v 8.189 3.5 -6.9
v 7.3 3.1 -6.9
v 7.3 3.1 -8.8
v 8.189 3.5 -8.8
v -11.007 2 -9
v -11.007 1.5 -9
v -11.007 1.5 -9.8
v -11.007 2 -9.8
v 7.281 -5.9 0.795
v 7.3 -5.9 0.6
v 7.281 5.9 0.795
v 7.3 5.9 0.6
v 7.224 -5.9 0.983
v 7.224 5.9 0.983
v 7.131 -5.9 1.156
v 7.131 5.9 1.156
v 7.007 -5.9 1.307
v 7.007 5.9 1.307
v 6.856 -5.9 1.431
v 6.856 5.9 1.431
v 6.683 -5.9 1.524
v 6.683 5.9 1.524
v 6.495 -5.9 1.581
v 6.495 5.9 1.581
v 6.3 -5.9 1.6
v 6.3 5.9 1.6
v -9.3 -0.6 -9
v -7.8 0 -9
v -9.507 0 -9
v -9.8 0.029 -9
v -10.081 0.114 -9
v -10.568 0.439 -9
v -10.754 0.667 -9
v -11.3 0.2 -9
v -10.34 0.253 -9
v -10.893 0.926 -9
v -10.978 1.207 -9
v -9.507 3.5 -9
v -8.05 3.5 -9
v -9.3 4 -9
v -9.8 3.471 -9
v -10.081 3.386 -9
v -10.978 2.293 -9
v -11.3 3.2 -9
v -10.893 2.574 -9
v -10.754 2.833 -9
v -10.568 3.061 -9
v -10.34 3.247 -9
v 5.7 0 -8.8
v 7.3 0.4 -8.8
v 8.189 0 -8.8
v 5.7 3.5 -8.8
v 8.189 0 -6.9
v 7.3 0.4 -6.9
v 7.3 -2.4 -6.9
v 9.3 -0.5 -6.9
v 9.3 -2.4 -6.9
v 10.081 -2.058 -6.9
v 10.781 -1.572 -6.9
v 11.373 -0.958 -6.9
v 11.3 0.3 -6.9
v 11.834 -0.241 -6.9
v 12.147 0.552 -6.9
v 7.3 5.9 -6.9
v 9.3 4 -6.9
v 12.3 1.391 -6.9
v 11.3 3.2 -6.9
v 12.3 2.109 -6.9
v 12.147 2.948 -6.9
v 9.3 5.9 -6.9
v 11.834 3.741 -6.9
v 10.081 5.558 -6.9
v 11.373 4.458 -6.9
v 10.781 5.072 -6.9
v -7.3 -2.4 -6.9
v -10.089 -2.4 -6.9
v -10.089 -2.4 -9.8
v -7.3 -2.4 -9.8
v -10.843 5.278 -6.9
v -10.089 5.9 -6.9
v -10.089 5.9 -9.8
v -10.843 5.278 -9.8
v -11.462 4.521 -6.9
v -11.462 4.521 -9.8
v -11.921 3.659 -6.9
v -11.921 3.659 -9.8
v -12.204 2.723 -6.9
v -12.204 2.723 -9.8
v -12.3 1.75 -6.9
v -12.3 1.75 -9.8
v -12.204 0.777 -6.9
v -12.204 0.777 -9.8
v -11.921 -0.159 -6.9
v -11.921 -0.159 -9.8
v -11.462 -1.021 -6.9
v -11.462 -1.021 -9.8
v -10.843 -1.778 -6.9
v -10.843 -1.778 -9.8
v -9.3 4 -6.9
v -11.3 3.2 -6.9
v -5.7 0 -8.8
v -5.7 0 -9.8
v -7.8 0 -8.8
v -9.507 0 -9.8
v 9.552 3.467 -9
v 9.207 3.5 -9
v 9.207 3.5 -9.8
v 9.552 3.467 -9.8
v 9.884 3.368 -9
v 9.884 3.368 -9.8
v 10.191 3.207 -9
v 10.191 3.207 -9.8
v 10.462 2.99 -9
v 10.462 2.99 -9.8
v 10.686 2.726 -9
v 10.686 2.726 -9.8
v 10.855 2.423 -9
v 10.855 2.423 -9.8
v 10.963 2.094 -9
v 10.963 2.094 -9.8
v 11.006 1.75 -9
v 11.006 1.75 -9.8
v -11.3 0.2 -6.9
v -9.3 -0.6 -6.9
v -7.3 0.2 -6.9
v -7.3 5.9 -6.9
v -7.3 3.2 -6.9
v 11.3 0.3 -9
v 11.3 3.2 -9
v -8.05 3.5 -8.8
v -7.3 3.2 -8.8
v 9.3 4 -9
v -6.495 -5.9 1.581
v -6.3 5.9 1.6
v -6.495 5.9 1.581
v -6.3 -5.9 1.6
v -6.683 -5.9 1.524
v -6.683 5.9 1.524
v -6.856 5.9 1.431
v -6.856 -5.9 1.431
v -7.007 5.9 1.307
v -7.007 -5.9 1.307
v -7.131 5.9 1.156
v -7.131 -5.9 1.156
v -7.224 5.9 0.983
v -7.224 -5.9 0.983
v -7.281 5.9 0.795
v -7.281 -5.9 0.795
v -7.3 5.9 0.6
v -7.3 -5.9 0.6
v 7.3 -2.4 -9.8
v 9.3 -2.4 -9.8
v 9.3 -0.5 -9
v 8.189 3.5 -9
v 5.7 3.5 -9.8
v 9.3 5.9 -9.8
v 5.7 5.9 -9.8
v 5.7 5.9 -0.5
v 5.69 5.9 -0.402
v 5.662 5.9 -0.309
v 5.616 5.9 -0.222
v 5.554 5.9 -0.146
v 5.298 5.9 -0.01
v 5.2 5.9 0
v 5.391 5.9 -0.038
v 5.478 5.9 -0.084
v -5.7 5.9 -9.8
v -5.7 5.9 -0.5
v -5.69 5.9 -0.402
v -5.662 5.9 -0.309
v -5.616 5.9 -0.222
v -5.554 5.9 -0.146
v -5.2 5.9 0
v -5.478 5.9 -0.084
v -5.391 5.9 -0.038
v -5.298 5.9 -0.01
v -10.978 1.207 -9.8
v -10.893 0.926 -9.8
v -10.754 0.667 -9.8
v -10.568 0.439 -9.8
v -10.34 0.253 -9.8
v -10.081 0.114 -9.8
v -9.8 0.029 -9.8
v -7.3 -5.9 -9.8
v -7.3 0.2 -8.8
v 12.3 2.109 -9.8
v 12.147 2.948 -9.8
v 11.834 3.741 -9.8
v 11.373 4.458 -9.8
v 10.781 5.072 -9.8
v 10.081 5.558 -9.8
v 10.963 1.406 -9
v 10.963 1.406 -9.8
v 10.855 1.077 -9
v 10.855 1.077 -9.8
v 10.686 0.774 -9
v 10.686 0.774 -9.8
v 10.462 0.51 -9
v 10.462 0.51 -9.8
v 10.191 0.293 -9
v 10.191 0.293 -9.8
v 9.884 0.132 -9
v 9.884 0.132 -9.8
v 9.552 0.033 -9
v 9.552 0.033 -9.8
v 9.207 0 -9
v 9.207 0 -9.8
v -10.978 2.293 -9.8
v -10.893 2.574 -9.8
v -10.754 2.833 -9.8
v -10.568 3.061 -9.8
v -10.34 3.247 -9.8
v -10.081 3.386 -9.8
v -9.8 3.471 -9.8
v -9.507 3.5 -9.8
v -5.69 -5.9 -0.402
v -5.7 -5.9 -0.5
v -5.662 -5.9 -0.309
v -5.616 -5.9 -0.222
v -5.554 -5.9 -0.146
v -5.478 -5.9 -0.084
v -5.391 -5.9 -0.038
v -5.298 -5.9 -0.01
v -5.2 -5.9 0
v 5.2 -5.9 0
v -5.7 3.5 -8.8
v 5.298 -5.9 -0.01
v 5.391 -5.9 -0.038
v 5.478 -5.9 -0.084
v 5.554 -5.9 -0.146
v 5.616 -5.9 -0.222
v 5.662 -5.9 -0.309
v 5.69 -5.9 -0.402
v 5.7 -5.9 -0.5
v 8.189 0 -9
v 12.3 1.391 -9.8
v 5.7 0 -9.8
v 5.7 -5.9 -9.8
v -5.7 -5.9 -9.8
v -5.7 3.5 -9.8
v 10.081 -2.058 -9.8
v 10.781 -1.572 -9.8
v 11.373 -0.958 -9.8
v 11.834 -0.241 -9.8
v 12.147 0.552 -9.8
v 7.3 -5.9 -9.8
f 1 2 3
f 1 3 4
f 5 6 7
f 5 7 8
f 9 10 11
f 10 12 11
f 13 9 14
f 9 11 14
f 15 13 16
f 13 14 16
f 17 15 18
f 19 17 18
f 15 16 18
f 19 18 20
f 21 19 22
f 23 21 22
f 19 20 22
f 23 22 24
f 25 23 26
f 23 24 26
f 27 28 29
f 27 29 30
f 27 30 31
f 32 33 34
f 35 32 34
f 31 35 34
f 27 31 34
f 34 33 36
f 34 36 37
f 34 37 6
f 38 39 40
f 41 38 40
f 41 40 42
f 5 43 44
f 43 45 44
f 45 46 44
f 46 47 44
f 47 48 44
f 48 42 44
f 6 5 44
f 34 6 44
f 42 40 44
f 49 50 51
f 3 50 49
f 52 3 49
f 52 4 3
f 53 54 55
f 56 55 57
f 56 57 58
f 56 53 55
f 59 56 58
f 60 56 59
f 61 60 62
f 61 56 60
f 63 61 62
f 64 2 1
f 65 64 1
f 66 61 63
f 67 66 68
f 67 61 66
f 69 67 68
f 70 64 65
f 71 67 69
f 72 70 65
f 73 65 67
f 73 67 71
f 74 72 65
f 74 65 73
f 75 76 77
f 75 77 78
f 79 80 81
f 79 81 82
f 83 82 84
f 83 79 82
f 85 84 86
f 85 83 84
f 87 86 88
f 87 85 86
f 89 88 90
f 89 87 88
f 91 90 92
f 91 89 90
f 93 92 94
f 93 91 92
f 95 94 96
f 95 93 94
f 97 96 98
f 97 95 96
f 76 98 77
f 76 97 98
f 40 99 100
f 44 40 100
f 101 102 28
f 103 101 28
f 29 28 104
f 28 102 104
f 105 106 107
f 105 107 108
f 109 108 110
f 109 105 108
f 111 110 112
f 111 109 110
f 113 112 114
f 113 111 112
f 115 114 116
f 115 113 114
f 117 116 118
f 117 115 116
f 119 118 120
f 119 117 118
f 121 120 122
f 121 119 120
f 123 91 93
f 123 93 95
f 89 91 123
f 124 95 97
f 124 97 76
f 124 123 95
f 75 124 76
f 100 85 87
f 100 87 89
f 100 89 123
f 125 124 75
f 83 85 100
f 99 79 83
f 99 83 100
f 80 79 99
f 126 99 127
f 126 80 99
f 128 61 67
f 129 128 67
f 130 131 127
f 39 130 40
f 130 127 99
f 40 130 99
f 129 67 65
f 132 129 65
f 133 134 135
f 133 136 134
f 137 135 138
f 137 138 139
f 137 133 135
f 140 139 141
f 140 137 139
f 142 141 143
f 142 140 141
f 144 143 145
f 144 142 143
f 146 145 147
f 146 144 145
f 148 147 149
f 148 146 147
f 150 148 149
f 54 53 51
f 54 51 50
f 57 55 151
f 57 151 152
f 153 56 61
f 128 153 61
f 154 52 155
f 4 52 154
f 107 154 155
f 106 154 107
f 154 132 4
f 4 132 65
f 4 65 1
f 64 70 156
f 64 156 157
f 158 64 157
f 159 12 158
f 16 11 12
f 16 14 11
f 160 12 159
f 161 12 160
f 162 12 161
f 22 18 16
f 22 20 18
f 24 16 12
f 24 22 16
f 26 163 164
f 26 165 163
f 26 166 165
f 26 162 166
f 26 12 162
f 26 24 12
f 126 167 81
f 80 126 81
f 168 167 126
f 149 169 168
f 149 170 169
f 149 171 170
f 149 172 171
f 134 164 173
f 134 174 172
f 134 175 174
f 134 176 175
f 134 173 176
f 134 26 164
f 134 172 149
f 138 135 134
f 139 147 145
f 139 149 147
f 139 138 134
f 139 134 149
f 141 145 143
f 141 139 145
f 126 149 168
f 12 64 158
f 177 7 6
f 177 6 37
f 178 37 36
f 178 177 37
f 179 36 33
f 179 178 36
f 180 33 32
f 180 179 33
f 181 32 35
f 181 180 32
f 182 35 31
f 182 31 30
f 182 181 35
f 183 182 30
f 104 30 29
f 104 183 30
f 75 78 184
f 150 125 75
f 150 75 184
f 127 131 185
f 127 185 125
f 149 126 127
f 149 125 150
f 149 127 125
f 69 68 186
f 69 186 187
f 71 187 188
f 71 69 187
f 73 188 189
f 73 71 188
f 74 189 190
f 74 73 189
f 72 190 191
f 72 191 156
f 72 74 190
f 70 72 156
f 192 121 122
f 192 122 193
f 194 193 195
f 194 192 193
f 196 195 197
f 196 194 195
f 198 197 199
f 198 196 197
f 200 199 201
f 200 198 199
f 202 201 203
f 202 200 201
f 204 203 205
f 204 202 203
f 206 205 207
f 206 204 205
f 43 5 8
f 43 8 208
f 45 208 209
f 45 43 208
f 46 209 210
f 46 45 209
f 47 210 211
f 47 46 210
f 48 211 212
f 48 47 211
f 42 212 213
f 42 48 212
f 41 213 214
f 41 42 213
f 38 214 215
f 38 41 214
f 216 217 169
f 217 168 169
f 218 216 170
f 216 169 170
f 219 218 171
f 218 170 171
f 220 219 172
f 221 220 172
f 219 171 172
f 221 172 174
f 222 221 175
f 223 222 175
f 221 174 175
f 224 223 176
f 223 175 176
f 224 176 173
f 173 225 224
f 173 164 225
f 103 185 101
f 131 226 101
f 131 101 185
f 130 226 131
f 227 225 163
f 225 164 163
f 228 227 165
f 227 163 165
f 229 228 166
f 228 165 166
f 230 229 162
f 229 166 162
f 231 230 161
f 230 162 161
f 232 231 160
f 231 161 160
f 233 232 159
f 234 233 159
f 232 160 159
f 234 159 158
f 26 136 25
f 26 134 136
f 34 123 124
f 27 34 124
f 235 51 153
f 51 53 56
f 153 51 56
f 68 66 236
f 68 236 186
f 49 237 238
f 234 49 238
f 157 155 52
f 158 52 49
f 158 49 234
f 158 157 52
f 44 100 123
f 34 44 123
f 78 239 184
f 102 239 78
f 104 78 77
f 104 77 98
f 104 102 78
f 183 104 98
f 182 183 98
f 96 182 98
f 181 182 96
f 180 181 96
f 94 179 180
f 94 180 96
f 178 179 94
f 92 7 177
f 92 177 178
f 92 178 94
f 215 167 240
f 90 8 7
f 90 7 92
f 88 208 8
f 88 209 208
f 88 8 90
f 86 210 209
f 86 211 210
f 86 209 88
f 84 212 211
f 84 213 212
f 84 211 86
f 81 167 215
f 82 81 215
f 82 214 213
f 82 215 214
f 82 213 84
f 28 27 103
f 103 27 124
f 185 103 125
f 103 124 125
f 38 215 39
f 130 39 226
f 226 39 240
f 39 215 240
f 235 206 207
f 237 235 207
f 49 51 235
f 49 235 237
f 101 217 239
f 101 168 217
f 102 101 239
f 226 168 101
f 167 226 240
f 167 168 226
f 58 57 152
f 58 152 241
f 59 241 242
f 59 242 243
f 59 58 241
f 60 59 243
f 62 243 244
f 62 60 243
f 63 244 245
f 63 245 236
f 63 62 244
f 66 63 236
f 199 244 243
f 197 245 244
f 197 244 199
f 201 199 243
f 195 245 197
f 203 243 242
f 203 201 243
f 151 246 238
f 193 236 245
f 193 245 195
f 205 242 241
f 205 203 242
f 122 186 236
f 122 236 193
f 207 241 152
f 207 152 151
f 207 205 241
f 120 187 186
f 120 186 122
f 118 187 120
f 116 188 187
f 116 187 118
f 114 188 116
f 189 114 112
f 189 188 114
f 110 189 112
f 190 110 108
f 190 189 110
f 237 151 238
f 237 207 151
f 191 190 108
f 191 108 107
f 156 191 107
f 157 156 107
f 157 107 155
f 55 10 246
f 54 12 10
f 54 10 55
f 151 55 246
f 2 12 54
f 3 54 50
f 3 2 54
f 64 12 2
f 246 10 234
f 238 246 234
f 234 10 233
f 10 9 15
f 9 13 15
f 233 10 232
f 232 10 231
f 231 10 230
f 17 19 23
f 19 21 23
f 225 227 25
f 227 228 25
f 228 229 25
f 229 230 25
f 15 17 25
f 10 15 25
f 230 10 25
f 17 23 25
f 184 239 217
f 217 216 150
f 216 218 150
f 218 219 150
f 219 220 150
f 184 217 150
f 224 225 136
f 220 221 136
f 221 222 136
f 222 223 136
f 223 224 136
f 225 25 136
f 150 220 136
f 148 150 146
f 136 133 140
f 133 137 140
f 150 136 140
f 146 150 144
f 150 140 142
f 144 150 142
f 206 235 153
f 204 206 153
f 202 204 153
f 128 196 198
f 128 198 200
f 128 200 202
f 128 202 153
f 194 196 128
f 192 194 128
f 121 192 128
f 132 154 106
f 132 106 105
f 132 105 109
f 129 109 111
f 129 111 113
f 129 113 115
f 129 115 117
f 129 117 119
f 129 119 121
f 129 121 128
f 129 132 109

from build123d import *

# Parameters (mm, degrees)
EXTRUDE_1_DEPTH      = 11.4
SKETCH_2_W           = 11.4
SKETCH_2_H           = 8.3
CUT_EXTRUDE_1_DEPTH  = 9.8
CUT_EXTRUDE_2_DEPTH  = 10.6
CUT_EXTRUDE_3_DEPTH  = 0.8
CUT_EXTRUDE_4_DEPTH  = 8.5
CUT_EXTRUDE_5_DEPTH  = 0.8
CUT_EXTRUDE_6_DEPTH  = 2.1
CUT_EXTRUDE_7_DEPTH  = 0.2
CUT_EXTRUDE_8_DEPTH  = 1
CUT_EXTRUDE_9_DEPTH  = 8.5
CUT_EXTRUDE_10_DEPTH = 1.9
CUT_EXTRUDE_11_DEPTH = 0.2
EXTRUDE_2_DEPTH      = 3.5
FILLET_1_R           = 0.5
FILLET_2_R           = 1
FILLET_3_R           = 1.5


with BuildPart() as part:
    # 草图1 → 凸台-拉伸1 (new body)
    with BuildSketch(Plane.XY.offset(1.6)):
        with BuildLine():
            Line((-10.088816953, -2.4), (9.3, -2.4))
            ThreePointArc((9.3, -2.4), (11.373008704, -0.957826085), (12.3, 1.391198782))
            Line((12.3, 1.391198782), (12.3, 2.108801218))
            ThreePointArc((12.3, 2.108801218), (11.373008704, 4.457826085), (9.3, 5.9))
            Line((9.3, 5.9), (-10.088816953, 5.9))
            ThreePointArc((-10.088816953, 5.9), (-12.3, 1.75), (-10.088816953, -2.4))
        make_face()
        with BuildLine():
            Line((-7.8, 0), (-10.8, 0))
            Line((-10.8, 0), (-11.007, 0.0828))
            Line((-11.007, 0.0828), (-11.007, 2))
            ThreePointArc((-11.007, 2), (-10.567660172, 3.060660172), (-9.507, 3.5))
            Line((-9.507, 3.5), (-8.05, 3.5))
            Line((-8.05, 3.5), (-7.3, 3.2))
            Line((-7.3, 3.2), (-7.3, 0.2))
            Line((-7.3, 0.2), (-7.8, 0))
        make_face(mode=Mode.SUBTRACT)
        with BuildLine():
            Line((7.3, 0.4), (7.3, 3.1))
            Line((7.3, 3.1), (8.188888889, 3.5))
            Line((8.188888889, 3.5), (9.206872393, 3.5))
            ThreePointArc((9.206872393, 3.5), (10.461862433, 2.99034879), (11.006177815, 1.75))
            ThreePointArc((11.006177815, 1.75), (10.461862433, 0.50965121), (9.206872393, 0))
            Line((9.206872393, 0), (8.188888889, 0))
            Line((8.188888889, 0), (7.3, 0.4))
        make_face(mode=Mode.SUBTRACT)
    extrude(amount=-EXTRUDE_1_DEPTH)

    # 草图2 → 切除-拉伸1 (cut)
    with BuildSketch(Plane(origin=(0, 0, -9.8), x_dir=(-1, 0, 0), z_dir=(0, 0, -1))):
        with Locations((0, 1.75)):
            Rectangle(SKETCH_2_W, SKETCH_2_H)
    extrude(amount=-CUT_EXTRUDE_1_DEPTH, mode=Mode.SUBTRACT)

    # 草图3 → 切除-拉伸2 (cut)
    with BuildSketch(Plane.XY.offset(1.6)):
        Polygon((-7.8, 0), (-10.8, 0), (-9.3, -0.6), align=None)
    extrude(amount=-CUT_EXTRUDE_2_DEPTH, mode=Mode.SUBTRACT)

    # 草图4 → 切除-拉伸3 (cut)
    with BuildSketch(Plane(origin=(0, 0, -9.8), x_dir=(-1, 0, 0), z_dir=(0, 0, -1))):
        Polygon((11.007, 0.0828), (10.8, 0), (11.007, 0), align=None)
    extrude(amount=-CUT_EXTRUDE_3_DEPTH, mode=Mode.SUBTRACT)

    # 草图5 → 切除-拉伸4 (cut)
    with BuildSketch(Plane.XY.offset(1.6)):
        with BuildLine():
            Line((-9.507, 3.5), (-8.05, 3.5))
            Line((-8.05, 3.5), (-7.3, 3.2))
            Line((-7.3, 3.2), (-7.3, 5.9))
            Line((-7.3, 5.9), (-10.088816953, 5.9))
            ThreePointArc((-10.088816953, 5.9), (-12.3, 1.75), (-10.088816953, -2.4))
            Line((-10.088816953, -2.4), (-7.3, -2.4))
            Line((-7.3, -2.4), (-7.3, 0.2))
            Line((-7.3, 0.2), (-9.3, -0.6))
            Line((-9.3, -0.6), (-11.007, 0.0828))
            Line((-11.007, 0.0828), (-11.007, 2))
            ThreePointArc((-11.007, 2), (-10.567660172, 3.060660172), (-9.507, 3.5))
        make_face()
    extrude(amount=-CUT_EXTRUDE_4_DEPTH, mode=Mode.SUBTRACT)

    # 草图6 → 切除-拉伸5 (cut)
    with BuildSketch(Plane(origin=(0, 0, -9.8), x_dir=(-1, 0, 0), z_dir=(0, 0, -1))):
        Polygon((7.3, 3.2), (8.05, 3.5), (5.7, 3.5), (5.7, 0), (7.8, 0), (7.3, 0.2), align=None)
    extrude(amount=-CUT_EXTRUDE_5_DEPTH, mode=Mode.SUBTRACT)

    # 草图7 → 切除-拉伸6 (cut)
    with BuildSketch(Plane.XY.offset(-6.9)):
        with BuildLine():
            Line((-9.507, 3.5), (-8.05, 3.5))
            Line((-8.05, 3.5), (-9.3, 4))
            Line((-9.3, 4), (-11.3, 3.2))
            Line((-11.3, 3.2), (-11.3, 0.2))
            Line((-11.3, 0.2), (-11.007, 0.0828))
            Line((-11.007, 0.0828), (-11.007, 2))
            ThreePointArc((-11.007, 2), (-10.567660172, 3.060660172), (-9.507, 3.5))
        make_face()
    extrude(amount=-CUT_EXTRUDE_6_DEPTH, mode=Mode.SUBTRACT)

    # 草图8 → 切除-拉伸7 (cut)
    with BuildSketch(Plane(origin=(0, 0, -9), x_dir=(-1, 0, 0), z_dir=(0, 0, -1))):
        Polygon((7.3, 3.2), (8.05, 3.5), (5.7, 3.5), (5.7, 0), (7.8, 0), (7.3, 0.2), align=None)
    extrude(amount=-CUT_EXTRUDE_7_DEPTH, mode=Mode.SUBTRACT)

    # 草图9 → 切除-拉伸8 (cut)
    with BuildSketch(Plane(origin=(0, 0, -9.8), x_dir=(-1, 0, 0), z_dir=(0, 0, -1))):
        Polygon((-7.3, 0.4), (-8.188888889, 0), (-5.7, 0), (-5.7, 3.5), (-8.188888889, 3.5), (-7.3, 3.1), align=None)
    extrude(amount=-CUT_EXTRUDE_8_DEPTH, mode=Mode.SUBTRACT)

    # 草图10 → 切除-拉伸9 (cut)
    with BuildSketch(Plane.XY.offset(1.6)):
        with BuildLine():
            Line((9.206872393, 0), (8.188888889, 0))
            Line((8.188888889, 0), (7.3, 0.4))
            Line((7.3, 0.4), (7.3, -2.4))
            Line((7.3, -2.4), (9.3, -2.4))
            ThreePointArc((9.3, -2.4), (11.373008704, -0.957826085), (12.3, 1.391198782))
            Line((12.3, 1.391198782), (12.3, 2.108801218))
            ThreePointArc((12.3, 2.108801218), (11.373008704, 4.457826085), (9.3, 5.9))
            Line((9.3, 5.9), (7.3, 5.9))
            Line((7.3, 5.9), (7.3, 3.1))
            Line((7.3, 3.1), (8.188888889, 3.5))
            Line((8.188888889, 3.5), (9.206872393, 3.5))
            ThreePointArc((9.206872393, 3.5), (10.461862433, 2.99034879), (11.006177815, 1.75))
            ThreePointArc((11.006177815, 1.75), (10.461862433, 0.50965121), (9.206872393, 0))
        make_face()
    extrude(amount=-CUT_EXTRUDE_9_DEPTH, mode=Mode.SUBTRACT)

    # 草图11 → 切除-拉伸10 (cut)
    with BuildSketch(Plane.XY.offset(-6.9)):
        with BuildLine():
            Line((9.206872393, 0), (8.188888889, 0))
            Line((8.188888889, 0), (9.3, -0.5))
            Line((9.3, -0.5), (11.3, 0.3))
            Line((11.3, 0.3), (11.3, 3.2))
            Line((11.3, 3.2), (9.3, 4))
            Line((9.3, 4), (8.188888889, 3.5))
            Line((8.188888889, 3.5), (9.206872393, 3.5))
            ThreePointArc((9.206872393, 3.5), (10.461862433, 2.99034879), (11.006177815, 1.75))
            ThreePointArc((11.006177815, 1.75), (10.461862433, 0.50965121), (9.206872393, 0))
        make_face()
    extrude(amount=-CUT_EXTRUDE_10_DEPTH, mode=Mode.SUBTRACT)

    # 草图12 → 切除-拉伸11 (cut)
    with BuildSketch(Plane.XY.offset(-8.8)):
        with BuildLine():
            Line((9.206872393, 0), (8.188888889, 0))
            Line((8.188888889, 0), (9.3, -0.5))
            Line((9.3, -0.5), (11.3, 0.3))
            Line((11.3, 0.3), (11.3, 3.2))
            Line((11.3, 3.2), (9.3, 4))
            Line((9.3, 4), (8.188888889, 3.5))
            Line((8.188888889, 3.5), (9.206872393, 3.5))
            ThreePointArc((9.206872393, 3.5), (10.461862433, 2.99034879), (11.006177815, 1.75))
            ThreePointArc((11.006177815, 1.75), (10.461862433, 0.50965121), (9.206872393, 0))
        make_face()
    extrude(amount=-CUT_EXTRUDE_11_DEPTH, mode=Mode.SUBTRACT)

    # 草图13 → 凸台-拉伸2 (add)
    with BuildSketch(Plane.XZ.offset(2.4)):
        Polygon((-7.3, 1.6), (7.3, 1.6), (7.3, -9.8), (5.7, -9.8), (5.7, 0), (-5.7, 0), (-5.7, -9.8), (-7.3, -9.8), align=None)
    extrude(amount=EXTRUDE_2_DEPTH)

    # 圆角1
    fillet_1_edges = [part.edges().sort_by_distance(p)[0] for p in [
        (5.7, 0, 0),
        (-5.7, 0, 0),
    ]]
    fillet(fillet_1_edges, radius=FILLET_1_R)

    # 圆角2
    fillet_2_edges = [part.edges().sort_by_distance(p)[0] for p in [
        (-7.3, 0, 1.6),
        (7.3, 0, 1.6),
    ]]
    fillet(fillet_2_edges, radius=FILLET_2_R)

    # 圆角3
    # the kernel refuses this fillet: 1.5 mm, written as the material it adds along each edge
    with BuildSketch(Plane(origin=(-11.007, 0, -9.8), x_dir=(1.0, 7.597747752272154e-12, 0), z_dir=(0, 0, 1))) as fillet_3_piece_1:
        with BuildLine():
            CenterArc((FILLET_3_R, FILLET_3_R), FILLET_3_R, 180, 90)
            Line((0, FILLET_3_R), (0, 0))
            Line((0, 0), (FILLET_3_R, 0))
        make_face()
    extrude(amount=0.8)


solid = part.part
